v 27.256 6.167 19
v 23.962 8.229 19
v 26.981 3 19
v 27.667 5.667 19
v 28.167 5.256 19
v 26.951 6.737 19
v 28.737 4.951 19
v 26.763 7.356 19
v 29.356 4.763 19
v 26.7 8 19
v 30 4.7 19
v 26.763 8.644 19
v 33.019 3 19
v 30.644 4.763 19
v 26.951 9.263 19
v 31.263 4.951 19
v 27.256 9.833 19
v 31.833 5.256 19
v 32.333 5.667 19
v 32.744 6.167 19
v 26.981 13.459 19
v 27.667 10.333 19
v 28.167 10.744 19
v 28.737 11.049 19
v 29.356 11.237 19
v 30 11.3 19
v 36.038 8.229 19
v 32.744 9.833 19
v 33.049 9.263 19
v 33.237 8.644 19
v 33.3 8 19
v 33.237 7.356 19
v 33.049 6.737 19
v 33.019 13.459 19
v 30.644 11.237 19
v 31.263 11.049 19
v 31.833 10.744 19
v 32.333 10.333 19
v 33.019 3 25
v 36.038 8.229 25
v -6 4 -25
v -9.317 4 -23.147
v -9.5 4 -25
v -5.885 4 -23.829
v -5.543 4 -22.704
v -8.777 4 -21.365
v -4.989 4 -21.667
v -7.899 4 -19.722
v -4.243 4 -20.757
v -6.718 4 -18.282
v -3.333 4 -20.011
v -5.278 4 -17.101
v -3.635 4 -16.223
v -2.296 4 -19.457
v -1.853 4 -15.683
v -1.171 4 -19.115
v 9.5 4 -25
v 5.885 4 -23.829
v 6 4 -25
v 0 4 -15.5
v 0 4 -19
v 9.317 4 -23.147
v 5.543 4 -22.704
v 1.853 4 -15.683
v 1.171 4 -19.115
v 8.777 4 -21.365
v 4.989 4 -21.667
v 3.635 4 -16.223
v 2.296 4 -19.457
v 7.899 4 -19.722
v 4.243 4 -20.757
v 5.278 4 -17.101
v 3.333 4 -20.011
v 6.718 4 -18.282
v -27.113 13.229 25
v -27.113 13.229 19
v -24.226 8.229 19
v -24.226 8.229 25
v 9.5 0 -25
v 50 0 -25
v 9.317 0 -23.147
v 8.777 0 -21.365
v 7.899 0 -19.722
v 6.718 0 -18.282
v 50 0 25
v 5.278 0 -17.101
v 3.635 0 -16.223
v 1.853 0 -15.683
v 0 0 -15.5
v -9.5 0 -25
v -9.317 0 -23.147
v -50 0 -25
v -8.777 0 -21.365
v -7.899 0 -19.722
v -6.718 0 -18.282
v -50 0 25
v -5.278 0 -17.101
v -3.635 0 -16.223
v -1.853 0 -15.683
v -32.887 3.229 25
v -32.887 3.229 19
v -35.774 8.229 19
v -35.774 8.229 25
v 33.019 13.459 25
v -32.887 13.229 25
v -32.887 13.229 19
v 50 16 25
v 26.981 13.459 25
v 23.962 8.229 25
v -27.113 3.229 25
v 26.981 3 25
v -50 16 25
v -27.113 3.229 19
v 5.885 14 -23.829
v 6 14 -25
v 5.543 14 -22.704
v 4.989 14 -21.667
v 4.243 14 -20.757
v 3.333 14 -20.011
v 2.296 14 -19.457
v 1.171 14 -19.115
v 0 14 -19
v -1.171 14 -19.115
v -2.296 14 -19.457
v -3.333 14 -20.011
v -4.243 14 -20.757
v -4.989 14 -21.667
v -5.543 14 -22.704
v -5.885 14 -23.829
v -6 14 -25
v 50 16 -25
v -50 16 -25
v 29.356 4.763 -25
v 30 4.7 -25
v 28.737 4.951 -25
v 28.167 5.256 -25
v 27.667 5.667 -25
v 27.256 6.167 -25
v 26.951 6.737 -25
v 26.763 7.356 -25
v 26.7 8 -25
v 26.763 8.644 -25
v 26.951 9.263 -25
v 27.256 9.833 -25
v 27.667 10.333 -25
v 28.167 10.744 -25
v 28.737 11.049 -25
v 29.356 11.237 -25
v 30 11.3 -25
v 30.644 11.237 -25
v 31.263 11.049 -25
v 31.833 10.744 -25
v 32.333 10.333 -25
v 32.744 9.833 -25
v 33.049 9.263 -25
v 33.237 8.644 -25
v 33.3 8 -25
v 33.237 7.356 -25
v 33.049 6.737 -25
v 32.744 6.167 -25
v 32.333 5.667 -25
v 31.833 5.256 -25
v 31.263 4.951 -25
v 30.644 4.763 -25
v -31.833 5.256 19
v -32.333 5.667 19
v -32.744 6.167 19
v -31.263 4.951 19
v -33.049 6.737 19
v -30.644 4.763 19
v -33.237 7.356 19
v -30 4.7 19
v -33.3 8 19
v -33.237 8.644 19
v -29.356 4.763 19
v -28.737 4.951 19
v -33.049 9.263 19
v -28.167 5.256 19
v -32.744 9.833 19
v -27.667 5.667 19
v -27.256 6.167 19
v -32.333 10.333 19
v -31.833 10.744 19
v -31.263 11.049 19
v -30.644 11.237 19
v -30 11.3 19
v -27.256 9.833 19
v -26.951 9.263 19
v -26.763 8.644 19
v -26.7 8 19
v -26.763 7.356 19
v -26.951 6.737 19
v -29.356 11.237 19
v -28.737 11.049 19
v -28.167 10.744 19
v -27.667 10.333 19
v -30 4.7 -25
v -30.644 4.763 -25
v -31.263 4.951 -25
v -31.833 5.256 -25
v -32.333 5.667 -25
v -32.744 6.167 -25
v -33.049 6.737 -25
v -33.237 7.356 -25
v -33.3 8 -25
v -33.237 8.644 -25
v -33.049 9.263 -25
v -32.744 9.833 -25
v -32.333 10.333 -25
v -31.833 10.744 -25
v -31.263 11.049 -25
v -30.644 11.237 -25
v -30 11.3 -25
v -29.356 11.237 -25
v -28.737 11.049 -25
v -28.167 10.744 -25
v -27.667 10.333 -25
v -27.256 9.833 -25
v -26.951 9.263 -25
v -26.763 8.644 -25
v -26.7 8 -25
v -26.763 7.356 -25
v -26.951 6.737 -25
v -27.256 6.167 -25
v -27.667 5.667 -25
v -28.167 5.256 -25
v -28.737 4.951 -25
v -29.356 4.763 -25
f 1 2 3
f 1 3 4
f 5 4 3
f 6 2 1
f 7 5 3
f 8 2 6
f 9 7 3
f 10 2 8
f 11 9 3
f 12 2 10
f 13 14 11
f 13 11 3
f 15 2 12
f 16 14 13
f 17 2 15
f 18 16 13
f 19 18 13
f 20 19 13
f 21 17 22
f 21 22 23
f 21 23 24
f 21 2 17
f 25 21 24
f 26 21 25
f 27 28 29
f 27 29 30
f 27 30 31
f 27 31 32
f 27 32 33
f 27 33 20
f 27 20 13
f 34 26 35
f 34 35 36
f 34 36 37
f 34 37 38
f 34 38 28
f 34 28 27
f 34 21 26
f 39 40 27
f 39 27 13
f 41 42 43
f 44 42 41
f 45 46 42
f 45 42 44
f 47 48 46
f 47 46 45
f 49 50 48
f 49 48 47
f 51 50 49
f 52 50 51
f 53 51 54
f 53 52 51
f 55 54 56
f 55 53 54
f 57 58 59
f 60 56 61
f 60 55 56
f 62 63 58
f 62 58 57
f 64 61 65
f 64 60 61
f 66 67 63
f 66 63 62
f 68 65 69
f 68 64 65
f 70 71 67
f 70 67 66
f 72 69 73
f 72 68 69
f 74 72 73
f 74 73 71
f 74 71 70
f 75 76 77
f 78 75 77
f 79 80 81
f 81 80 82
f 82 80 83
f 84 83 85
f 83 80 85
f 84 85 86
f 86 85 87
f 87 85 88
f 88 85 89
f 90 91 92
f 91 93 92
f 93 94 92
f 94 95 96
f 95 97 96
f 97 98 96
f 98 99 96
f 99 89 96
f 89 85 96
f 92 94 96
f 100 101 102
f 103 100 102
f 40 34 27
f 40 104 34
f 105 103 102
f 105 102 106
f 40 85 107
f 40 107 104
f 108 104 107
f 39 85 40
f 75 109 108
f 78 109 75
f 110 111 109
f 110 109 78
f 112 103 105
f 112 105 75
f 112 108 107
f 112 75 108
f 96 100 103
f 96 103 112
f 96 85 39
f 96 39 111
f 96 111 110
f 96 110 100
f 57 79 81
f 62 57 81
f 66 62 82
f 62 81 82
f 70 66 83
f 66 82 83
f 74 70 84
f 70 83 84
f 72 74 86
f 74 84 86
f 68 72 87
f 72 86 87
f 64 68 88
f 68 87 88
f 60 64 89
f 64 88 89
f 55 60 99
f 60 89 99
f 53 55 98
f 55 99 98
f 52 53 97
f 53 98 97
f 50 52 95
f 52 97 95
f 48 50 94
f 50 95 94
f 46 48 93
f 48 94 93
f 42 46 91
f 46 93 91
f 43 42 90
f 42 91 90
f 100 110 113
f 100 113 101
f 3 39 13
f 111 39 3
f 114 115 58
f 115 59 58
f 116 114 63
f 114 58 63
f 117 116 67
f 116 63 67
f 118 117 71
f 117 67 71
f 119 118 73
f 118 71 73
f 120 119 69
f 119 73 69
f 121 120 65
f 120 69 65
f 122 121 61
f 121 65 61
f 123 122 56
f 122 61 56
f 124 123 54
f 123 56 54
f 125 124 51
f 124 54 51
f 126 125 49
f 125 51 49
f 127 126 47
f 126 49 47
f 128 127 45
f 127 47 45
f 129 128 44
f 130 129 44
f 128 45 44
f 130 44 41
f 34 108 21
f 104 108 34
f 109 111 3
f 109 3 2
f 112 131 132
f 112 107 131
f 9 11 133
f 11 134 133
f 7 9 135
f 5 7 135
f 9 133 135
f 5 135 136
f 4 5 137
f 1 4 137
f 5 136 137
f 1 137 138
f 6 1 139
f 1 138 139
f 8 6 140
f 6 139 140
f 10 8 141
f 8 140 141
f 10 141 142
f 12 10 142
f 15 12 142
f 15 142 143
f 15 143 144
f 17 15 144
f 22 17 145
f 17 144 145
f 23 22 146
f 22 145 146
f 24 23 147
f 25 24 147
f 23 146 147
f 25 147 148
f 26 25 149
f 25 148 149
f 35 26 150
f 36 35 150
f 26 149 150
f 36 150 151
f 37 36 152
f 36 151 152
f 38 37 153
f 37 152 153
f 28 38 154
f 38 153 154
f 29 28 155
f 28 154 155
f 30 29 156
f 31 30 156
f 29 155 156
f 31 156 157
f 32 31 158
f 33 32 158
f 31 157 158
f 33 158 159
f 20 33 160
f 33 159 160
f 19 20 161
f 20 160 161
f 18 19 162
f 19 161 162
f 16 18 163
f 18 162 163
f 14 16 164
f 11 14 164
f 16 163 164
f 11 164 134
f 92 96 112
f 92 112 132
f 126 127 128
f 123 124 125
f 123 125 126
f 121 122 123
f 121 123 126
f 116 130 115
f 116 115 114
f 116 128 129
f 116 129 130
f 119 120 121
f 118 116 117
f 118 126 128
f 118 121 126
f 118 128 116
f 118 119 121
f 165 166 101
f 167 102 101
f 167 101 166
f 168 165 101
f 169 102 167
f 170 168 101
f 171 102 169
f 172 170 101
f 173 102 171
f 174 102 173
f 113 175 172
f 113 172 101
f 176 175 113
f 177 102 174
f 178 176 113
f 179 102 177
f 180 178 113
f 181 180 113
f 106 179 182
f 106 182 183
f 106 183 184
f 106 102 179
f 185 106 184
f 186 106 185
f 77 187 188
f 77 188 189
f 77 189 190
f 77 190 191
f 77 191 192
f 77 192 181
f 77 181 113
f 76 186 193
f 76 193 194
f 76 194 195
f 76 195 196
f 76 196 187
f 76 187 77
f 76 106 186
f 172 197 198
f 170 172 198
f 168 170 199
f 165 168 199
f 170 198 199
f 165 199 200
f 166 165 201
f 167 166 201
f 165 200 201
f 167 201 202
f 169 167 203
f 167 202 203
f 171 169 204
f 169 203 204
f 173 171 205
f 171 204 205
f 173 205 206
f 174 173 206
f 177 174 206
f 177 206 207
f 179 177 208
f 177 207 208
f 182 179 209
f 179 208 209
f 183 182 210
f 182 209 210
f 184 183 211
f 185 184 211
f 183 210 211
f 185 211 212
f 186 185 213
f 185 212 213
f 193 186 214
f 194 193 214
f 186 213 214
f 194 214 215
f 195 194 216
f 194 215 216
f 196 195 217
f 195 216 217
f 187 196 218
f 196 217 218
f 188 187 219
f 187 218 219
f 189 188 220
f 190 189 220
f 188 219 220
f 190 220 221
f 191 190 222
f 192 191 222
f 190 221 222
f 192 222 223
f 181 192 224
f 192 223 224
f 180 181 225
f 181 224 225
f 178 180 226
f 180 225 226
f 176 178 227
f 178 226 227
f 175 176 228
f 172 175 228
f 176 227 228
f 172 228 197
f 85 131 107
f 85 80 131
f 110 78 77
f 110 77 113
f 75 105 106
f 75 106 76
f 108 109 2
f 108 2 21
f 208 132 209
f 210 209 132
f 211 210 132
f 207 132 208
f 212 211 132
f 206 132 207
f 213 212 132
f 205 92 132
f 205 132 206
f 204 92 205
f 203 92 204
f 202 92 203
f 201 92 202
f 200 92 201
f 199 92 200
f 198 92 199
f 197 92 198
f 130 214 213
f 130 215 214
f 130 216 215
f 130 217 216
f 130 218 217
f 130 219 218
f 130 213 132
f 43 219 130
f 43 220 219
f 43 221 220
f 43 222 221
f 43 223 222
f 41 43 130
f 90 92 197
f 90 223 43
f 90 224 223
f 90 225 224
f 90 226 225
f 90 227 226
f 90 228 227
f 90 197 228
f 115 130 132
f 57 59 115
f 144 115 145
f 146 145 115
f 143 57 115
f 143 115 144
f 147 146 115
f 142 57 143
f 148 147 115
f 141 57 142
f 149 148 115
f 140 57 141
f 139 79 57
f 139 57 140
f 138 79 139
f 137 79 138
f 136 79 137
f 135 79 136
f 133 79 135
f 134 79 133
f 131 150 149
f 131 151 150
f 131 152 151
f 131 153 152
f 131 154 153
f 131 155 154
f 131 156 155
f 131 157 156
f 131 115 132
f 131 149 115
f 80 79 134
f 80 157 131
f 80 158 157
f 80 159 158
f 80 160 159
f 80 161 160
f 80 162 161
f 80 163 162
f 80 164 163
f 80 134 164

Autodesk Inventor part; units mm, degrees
ref_plane "YZ Plane" through (0, 0, 0) normal (1, 0, 0) x (0, 1, 0)
ref_plane "XZ Plane" through (0, 0, 0) normal (0, 1, 0) x (-1, 0, 0)
ref_plane "XY Plane" through (0, 0, 0) normal (0, 0, 1) x (1, 0, 0)
sketch "Schizzo1" plane through (0, 0, 0) normal (0, 1, 0) x (-1, 0, 0)
  line L0 (50, -25) -> (-50, -25)
  line L1 (-50, -25) -> (-50, 25)
  line L2 (-50, 25) -> (50, 25)
  line L3 (50, 25) -> (50, -25)
  line L4 (50, -25) -> (-50, 25) construction
  line L5 (-50, -25) -> (50, 25) construction
  point P0 (0, 0)
  point P1 (0, 0)
  point P2 (0, 0)
  dimension "d0" = 50
  dimension "d9" = 100
extrude "Estrusione1" add sketch "Schizzo1" along normal blind 16
sketch "Schizzo2" plane through (0, 0, 0) normal (0, -1, 0) x (1, 0, 0)
  circle A0 centre (0, -25) radius 9.5
  line L0 (50, -25) -> (-50, -25) projected
  point P0 (0, 0)
  dimension "d3" = 19
extrude "Estrusione2" cut sketch "Schizzo2" against normal blind 4
sketch "Schizzo3" plane through (0, 4, 0) normal (0, -1, 0) x (1, 0, 0)
  circle A0 centre (0, -25) radius 6
  line L0 (9.5, -25) -> (-9.5, -25) projected
  point P0 (0, 0)
  dimension "d6" = 12
extrude "Estrusione3" cut sketch "Schizzo3" against normal blind 10
sketch "Schizzo4" plane through (-50, 0, 25) normal (0, 0, 1) x (1, 0, 0)
  line L0 (50, 0) -> (50, 8)
  line L1 (50, 0) -> (58, 0) construction
  line L2 (50, 8) -> (20, 8)
  line L3 (50, 8) -> (80, 8)
  line L4 (50, 8) -> (80, 8) construction
  dimension "d10" = 8
  dimension "d11" = 90
  dimension "d12" = 30
  dimension "d13" = 90
  dimension "d14" = 30
  dimension "d15" = 0
hole "Foro1" at (30, 8, 25) at (-30, 8, 25) direction (0, 0, -1) diameter 6.6 end through all clearance for "Bullone a testa esagonale" size "M6" standard "ANSI - Profilo M Metrico"
sketch "Schizzo5" plane through (-50, 0, 25) normal (0, 0, 1) x (1, 0, 0)
  circle A0 centre (80, 8) radius 3.3 projected
  circle A1 centre (80, 8) radius 5
  circle A2 centre (20, 8.2293) radius 5
  line L0 (17.1132, 3.2293) -> (14.2265, 8.2293)
  line L1 (14.2265, 8.2293) -> (17.1132, 13.2293)
  line L2 (17.1132, 13.2293) -> (22.8868, 13.2293)
  line L3 (22.8868, 13.2293) -> (25.7735, 8.2293)
  line L4 (25.7735, 8.2293) -> (22.8868, 3.2293)
  line L5 (22.8868, 3.2293) -> (17.1132, 3.2293)
  line L6 (76.9809, 3) -> (73.9618, 8.2293)
  line L7 (73.9618, 8.2293) -> (76.9809, 13.4586)
  line L8 (76.9809, 13.4586) -> (83.0191, 13.4586)
  line L9 (83.0191, 13.4586) -> (86.0382, 8.2293)
  line L10 (86.0382, 8.2293) -> (83.0191, 3)
  line L11 (83.0191, 3) -> (76.9809, 3)
  point P0 (50, 0)
  point P1 (20, 3.2293)
  point P2 (80, 8.2293)
  point P3 (80, 3)
  dimension "d24" = 10
  dimension "d25" = 10
extrude "Estrusione4" cut sketch "Schizzo5" against normal blind 6 contours A0 | A1 | L11 L6 L7 L8 L9 L10 | A2 | A2 L3 L4 | A2 L2 L3 | L4 L5 A2 | A2 L1 L2 | L5 L0 A2 | A2 L0 L1
properties part number "14_base_avanti"
